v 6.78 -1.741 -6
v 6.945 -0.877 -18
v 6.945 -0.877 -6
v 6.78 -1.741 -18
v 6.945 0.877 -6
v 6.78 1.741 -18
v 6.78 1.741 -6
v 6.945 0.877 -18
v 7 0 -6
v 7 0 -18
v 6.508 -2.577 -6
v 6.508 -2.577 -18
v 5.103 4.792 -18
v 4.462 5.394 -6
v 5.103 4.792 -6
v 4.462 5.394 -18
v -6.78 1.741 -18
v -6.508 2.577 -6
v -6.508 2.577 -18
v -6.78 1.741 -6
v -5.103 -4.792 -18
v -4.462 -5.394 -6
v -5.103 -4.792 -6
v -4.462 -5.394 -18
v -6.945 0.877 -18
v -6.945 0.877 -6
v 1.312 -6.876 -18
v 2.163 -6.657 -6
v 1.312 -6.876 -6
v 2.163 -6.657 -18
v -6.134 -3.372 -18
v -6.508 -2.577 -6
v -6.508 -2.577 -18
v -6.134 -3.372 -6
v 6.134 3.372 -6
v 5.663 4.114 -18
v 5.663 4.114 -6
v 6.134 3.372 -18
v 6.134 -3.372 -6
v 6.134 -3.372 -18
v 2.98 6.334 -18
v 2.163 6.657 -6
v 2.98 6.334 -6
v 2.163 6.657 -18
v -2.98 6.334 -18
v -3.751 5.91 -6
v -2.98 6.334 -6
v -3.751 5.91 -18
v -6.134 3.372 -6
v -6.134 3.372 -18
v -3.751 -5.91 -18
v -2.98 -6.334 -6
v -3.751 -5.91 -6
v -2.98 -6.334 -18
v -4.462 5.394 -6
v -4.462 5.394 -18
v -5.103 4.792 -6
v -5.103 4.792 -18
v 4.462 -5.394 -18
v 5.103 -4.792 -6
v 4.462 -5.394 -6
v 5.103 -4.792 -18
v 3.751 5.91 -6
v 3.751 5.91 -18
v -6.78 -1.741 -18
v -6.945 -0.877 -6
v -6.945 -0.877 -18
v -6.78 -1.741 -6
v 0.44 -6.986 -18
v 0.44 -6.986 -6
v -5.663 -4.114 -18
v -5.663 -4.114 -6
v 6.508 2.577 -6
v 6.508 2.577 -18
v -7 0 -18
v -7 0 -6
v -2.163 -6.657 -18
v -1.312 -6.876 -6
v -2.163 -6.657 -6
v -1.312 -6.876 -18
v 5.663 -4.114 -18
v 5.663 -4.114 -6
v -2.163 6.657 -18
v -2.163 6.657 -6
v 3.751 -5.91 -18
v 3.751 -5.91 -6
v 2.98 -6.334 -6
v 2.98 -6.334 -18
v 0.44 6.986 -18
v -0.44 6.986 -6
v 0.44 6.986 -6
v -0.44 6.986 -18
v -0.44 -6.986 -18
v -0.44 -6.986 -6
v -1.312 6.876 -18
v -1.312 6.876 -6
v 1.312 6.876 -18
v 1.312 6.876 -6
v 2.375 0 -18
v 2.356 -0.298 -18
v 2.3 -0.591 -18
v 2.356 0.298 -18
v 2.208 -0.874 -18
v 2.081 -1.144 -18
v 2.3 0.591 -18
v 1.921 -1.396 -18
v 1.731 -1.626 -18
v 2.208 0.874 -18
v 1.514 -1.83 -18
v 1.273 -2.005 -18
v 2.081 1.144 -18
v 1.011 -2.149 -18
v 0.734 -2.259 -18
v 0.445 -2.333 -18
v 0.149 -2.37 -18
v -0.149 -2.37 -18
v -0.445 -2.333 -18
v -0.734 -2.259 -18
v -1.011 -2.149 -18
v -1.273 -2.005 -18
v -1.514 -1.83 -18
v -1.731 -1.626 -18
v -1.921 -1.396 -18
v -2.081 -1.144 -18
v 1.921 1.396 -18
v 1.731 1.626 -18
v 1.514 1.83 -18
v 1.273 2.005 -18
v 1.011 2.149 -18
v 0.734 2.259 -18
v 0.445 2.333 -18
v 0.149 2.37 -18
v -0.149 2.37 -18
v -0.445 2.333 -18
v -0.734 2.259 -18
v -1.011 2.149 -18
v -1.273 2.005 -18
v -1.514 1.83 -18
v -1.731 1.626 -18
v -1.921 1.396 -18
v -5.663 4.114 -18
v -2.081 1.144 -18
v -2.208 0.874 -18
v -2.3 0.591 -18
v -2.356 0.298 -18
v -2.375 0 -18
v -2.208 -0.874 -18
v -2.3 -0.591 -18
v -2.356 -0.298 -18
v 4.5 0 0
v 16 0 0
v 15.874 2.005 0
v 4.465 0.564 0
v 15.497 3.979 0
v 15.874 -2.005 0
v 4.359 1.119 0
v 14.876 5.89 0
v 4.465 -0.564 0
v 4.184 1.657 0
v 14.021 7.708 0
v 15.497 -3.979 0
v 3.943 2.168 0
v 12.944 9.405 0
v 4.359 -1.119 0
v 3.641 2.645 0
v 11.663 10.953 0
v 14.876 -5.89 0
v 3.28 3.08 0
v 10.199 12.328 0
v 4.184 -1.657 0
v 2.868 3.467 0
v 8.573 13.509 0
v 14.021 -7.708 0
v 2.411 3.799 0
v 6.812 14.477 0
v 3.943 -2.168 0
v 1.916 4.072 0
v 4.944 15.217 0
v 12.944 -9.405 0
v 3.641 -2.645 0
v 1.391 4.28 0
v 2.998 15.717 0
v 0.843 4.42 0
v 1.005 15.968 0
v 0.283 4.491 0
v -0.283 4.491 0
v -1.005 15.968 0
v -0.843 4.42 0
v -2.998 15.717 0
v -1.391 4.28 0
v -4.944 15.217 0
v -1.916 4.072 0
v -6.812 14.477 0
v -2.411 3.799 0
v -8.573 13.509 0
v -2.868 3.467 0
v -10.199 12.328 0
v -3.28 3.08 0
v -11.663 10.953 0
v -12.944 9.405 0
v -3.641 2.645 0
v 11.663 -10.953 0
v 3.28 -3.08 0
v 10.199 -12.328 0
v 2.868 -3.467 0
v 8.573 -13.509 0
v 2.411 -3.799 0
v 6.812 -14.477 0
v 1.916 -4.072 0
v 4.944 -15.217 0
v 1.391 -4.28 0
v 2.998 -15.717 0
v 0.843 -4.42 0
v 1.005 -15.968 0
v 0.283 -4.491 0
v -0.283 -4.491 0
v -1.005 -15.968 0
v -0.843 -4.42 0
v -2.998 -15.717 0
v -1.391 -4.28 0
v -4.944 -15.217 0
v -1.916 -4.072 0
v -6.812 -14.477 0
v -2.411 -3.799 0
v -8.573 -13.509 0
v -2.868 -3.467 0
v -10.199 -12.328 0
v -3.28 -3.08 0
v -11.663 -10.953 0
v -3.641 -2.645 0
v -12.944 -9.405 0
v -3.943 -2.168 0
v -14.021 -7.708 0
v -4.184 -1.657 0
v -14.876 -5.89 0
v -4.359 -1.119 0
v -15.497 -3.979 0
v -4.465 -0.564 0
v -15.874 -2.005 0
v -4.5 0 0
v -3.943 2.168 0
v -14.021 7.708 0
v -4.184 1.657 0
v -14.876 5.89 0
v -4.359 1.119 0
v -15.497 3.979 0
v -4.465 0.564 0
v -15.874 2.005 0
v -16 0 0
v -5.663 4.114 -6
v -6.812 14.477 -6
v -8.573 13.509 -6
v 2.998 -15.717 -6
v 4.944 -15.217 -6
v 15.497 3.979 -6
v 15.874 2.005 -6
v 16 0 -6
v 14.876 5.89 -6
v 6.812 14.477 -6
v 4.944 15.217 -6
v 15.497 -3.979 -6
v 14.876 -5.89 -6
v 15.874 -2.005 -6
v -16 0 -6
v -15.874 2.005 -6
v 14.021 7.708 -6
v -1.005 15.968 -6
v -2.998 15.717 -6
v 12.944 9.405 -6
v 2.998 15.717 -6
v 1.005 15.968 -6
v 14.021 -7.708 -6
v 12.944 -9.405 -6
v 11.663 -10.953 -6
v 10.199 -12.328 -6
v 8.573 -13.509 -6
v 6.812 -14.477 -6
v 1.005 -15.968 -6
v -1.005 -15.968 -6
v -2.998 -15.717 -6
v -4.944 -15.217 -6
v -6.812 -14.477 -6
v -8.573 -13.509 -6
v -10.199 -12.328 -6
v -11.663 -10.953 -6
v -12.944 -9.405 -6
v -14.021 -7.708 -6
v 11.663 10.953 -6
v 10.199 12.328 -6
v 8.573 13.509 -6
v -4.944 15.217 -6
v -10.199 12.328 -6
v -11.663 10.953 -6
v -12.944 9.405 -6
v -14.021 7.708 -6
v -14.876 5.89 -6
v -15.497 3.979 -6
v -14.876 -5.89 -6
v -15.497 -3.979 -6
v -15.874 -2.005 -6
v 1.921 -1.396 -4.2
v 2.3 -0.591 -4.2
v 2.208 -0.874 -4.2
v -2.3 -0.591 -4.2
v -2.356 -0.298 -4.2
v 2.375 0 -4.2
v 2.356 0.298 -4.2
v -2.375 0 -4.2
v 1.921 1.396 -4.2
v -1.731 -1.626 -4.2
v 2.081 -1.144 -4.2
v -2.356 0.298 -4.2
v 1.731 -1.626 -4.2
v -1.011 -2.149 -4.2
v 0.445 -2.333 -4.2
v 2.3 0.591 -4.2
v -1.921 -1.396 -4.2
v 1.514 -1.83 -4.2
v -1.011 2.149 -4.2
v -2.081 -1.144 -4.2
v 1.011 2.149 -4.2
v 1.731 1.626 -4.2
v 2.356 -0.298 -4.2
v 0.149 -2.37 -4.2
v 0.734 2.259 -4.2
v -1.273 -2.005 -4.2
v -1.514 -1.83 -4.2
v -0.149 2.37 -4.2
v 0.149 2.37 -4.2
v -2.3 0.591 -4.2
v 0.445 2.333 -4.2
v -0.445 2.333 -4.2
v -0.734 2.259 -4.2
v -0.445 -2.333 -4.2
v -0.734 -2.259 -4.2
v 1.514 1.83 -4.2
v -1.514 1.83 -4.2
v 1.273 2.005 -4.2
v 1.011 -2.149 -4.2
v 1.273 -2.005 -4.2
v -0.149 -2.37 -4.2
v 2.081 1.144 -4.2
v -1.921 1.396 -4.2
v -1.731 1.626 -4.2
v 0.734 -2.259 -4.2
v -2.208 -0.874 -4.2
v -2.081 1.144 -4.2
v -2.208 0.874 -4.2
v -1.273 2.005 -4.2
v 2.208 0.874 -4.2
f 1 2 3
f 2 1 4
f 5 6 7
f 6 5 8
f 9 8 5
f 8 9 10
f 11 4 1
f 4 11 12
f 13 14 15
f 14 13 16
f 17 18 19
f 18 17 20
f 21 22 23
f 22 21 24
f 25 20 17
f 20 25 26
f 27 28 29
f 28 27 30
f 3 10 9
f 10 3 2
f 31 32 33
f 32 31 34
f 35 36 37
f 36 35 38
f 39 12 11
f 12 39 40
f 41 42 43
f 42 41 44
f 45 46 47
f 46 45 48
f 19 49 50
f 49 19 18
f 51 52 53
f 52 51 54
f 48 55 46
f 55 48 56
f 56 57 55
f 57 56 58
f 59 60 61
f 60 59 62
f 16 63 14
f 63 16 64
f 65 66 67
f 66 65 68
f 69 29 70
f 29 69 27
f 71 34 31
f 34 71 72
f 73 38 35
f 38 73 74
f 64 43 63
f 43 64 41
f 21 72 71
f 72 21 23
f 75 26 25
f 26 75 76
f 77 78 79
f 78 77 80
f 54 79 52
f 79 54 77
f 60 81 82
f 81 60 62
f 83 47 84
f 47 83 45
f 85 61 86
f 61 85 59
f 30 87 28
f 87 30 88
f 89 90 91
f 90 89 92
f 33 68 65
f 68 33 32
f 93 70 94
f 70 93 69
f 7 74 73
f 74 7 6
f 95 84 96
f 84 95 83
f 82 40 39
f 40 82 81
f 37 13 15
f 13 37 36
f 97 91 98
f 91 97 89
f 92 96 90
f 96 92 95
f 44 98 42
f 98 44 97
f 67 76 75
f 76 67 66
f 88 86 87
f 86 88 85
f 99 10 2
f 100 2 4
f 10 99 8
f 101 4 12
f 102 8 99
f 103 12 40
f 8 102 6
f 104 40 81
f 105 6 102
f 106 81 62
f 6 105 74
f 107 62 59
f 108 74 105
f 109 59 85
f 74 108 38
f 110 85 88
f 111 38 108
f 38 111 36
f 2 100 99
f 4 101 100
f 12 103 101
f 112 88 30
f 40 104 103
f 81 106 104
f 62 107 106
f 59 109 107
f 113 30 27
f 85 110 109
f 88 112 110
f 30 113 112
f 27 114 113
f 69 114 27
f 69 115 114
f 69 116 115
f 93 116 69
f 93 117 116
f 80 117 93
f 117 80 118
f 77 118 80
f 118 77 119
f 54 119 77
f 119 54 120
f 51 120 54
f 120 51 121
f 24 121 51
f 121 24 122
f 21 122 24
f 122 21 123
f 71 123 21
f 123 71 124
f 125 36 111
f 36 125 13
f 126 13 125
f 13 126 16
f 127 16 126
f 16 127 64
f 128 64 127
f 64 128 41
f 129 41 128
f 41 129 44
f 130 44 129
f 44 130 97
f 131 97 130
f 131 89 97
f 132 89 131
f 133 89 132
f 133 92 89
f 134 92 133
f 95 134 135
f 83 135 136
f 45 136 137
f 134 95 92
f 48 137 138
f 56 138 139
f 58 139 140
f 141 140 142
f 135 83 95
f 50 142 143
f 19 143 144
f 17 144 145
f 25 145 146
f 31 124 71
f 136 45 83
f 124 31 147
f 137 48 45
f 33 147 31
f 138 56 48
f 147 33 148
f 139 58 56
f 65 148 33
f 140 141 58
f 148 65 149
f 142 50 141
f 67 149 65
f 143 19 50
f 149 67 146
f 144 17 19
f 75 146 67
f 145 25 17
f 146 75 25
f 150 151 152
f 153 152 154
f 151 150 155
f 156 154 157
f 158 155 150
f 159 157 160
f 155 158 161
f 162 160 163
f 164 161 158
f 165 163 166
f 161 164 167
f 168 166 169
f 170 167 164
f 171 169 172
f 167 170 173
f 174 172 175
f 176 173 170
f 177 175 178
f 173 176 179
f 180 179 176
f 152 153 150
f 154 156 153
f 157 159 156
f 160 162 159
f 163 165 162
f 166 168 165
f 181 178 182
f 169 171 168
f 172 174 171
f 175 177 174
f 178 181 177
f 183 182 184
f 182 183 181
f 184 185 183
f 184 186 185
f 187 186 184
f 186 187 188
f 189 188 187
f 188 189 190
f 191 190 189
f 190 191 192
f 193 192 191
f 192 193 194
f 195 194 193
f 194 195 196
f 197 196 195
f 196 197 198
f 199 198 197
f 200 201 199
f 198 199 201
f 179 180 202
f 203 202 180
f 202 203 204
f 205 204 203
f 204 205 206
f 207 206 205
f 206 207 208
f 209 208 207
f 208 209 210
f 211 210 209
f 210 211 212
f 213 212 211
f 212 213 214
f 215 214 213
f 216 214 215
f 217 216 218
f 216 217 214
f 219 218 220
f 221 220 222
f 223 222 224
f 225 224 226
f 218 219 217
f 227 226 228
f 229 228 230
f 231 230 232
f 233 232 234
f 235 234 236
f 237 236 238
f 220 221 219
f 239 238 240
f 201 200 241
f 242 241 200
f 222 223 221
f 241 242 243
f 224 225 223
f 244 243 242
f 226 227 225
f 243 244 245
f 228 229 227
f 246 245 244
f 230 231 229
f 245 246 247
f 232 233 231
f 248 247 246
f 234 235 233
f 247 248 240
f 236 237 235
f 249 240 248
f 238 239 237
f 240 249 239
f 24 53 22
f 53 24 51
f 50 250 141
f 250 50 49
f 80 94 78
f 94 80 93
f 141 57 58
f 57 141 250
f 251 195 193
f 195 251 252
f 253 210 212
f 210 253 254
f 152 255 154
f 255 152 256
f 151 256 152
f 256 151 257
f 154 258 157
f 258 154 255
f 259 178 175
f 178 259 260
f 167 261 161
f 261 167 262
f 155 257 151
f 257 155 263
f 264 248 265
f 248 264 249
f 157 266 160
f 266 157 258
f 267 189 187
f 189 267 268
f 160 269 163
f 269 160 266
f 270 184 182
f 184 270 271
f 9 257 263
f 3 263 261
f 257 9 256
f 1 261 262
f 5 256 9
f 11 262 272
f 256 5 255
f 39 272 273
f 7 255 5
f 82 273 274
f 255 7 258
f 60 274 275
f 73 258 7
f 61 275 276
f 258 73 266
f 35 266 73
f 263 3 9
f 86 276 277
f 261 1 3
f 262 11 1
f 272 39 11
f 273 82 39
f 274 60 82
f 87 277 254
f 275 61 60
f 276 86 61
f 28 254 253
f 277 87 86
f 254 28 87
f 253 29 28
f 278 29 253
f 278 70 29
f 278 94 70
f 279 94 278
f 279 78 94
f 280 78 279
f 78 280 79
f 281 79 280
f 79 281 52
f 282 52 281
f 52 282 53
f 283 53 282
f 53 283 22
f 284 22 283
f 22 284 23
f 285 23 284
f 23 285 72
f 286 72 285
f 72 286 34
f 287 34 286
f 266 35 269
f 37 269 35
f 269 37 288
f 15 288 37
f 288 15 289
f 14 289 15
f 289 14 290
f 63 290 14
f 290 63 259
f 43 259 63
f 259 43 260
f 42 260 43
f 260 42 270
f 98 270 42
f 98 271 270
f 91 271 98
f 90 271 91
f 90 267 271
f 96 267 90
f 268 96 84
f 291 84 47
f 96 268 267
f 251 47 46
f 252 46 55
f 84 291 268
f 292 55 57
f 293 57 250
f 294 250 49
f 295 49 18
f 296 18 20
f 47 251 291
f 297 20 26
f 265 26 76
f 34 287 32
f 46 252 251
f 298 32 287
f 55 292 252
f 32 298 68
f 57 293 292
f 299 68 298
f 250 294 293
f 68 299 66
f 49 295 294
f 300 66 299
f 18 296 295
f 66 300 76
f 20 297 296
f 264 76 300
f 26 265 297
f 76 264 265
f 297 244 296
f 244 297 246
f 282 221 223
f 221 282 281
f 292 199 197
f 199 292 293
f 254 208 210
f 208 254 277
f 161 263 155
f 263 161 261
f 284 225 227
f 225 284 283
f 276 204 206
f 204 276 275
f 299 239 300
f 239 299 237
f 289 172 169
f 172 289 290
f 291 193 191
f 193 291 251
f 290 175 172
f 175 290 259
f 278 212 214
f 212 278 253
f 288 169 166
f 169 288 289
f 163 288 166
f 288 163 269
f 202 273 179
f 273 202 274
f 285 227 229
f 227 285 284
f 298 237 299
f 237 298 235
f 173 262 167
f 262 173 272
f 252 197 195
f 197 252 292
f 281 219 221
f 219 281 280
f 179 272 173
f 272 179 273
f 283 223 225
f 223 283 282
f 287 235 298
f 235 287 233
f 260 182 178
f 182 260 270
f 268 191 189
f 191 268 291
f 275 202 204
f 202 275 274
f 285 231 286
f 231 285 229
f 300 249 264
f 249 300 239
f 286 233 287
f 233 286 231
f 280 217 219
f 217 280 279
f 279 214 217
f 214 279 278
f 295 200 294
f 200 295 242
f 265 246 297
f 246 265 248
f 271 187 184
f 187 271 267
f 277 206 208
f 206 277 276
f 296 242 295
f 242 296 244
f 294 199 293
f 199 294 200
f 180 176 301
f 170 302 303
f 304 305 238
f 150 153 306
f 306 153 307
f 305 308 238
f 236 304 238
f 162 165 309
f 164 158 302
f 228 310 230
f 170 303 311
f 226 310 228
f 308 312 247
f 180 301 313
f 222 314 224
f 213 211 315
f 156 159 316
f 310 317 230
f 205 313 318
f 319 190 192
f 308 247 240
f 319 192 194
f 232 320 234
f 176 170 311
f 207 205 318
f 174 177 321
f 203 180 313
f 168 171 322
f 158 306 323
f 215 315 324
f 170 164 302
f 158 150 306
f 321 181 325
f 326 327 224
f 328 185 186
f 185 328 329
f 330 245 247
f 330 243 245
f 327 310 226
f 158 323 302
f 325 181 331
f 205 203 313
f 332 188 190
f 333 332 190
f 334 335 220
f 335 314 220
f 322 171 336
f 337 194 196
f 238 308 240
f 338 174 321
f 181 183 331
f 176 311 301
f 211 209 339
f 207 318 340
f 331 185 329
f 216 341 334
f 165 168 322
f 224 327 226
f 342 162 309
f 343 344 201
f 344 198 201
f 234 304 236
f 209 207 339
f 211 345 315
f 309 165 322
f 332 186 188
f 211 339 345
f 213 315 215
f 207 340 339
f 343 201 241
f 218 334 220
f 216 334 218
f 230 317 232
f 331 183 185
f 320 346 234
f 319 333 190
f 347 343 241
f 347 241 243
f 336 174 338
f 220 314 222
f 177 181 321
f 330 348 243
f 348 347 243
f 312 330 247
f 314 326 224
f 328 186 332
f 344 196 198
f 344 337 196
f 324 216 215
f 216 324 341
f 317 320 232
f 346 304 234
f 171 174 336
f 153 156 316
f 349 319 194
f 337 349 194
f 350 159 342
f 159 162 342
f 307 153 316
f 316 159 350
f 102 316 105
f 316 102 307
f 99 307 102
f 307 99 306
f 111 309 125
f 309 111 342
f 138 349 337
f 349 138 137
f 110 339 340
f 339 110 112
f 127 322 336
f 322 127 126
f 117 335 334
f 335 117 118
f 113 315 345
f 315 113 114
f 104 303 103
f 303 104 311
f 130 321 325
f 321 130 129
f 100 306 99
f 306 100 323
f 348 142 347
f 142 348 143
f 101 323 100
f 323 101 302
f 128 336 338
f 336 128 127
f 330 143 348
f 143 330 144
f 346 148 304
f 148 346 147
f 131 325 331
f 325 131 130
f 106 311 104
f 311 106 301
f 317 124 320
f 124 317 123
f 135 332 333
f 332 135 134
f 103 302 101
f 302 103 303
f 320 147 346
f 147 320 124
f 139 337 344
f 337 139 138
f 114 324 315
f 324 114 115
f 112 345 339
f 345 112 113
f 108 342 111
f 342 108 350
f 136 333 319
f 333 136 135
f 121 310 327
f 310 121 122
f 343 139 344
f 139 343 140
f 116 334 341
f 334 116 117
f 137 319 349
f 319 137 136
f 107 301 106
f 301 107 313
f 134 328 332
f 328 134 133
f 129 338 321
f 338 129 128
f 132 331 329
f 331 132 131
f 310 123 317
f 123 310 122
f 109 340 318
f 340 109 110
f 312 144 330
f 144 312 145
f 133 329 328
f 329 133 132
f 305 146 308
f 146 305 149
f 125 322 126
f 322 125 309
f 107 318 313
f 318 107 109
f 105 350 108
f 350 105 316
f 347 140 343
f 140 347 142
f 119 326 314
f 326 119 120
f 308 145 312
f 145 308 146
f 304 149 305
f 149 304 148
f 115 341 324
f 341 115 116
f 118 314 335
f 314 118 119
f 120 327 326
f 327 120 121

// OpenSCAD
$fn = 50;


difference() {
	union() {
		translate(v = [0, 0, -18.0000000000]) {
			cylinder(h = 18, r = 7.0000000000);
		}
		translate(v = [0, 0, -6.0000000000]) {
			cylinder(h = 6, r = 16.0000000000);
		}
	}
	union() {
		translate(v = [0, 0, 0]) {
			rotate(a = [0, 0, 0]) {
				difference() {
					union() {
						#translate(v = [0, 0, -18.0000000000]) {
							cylinder(h = 18, r = 2.2500000000);
						}
						#translate(v = [0, 0, -4.2000000000]) {
							cylinder(h = 4.2000000000, r1 = 2.3750000000, r2 = 4.5000000000);
						}
						#translate(v = [0, 0, -18.0000000000]) {
							cylinder(h = 18, r = 2.3750000000);
						}
						#translate(v = [0, 0, -18.0000000000]) {
							cylinder(h = 18, r = 2.2500000000);
						}
					}
					union();
				}
			}
		}
	}
}
